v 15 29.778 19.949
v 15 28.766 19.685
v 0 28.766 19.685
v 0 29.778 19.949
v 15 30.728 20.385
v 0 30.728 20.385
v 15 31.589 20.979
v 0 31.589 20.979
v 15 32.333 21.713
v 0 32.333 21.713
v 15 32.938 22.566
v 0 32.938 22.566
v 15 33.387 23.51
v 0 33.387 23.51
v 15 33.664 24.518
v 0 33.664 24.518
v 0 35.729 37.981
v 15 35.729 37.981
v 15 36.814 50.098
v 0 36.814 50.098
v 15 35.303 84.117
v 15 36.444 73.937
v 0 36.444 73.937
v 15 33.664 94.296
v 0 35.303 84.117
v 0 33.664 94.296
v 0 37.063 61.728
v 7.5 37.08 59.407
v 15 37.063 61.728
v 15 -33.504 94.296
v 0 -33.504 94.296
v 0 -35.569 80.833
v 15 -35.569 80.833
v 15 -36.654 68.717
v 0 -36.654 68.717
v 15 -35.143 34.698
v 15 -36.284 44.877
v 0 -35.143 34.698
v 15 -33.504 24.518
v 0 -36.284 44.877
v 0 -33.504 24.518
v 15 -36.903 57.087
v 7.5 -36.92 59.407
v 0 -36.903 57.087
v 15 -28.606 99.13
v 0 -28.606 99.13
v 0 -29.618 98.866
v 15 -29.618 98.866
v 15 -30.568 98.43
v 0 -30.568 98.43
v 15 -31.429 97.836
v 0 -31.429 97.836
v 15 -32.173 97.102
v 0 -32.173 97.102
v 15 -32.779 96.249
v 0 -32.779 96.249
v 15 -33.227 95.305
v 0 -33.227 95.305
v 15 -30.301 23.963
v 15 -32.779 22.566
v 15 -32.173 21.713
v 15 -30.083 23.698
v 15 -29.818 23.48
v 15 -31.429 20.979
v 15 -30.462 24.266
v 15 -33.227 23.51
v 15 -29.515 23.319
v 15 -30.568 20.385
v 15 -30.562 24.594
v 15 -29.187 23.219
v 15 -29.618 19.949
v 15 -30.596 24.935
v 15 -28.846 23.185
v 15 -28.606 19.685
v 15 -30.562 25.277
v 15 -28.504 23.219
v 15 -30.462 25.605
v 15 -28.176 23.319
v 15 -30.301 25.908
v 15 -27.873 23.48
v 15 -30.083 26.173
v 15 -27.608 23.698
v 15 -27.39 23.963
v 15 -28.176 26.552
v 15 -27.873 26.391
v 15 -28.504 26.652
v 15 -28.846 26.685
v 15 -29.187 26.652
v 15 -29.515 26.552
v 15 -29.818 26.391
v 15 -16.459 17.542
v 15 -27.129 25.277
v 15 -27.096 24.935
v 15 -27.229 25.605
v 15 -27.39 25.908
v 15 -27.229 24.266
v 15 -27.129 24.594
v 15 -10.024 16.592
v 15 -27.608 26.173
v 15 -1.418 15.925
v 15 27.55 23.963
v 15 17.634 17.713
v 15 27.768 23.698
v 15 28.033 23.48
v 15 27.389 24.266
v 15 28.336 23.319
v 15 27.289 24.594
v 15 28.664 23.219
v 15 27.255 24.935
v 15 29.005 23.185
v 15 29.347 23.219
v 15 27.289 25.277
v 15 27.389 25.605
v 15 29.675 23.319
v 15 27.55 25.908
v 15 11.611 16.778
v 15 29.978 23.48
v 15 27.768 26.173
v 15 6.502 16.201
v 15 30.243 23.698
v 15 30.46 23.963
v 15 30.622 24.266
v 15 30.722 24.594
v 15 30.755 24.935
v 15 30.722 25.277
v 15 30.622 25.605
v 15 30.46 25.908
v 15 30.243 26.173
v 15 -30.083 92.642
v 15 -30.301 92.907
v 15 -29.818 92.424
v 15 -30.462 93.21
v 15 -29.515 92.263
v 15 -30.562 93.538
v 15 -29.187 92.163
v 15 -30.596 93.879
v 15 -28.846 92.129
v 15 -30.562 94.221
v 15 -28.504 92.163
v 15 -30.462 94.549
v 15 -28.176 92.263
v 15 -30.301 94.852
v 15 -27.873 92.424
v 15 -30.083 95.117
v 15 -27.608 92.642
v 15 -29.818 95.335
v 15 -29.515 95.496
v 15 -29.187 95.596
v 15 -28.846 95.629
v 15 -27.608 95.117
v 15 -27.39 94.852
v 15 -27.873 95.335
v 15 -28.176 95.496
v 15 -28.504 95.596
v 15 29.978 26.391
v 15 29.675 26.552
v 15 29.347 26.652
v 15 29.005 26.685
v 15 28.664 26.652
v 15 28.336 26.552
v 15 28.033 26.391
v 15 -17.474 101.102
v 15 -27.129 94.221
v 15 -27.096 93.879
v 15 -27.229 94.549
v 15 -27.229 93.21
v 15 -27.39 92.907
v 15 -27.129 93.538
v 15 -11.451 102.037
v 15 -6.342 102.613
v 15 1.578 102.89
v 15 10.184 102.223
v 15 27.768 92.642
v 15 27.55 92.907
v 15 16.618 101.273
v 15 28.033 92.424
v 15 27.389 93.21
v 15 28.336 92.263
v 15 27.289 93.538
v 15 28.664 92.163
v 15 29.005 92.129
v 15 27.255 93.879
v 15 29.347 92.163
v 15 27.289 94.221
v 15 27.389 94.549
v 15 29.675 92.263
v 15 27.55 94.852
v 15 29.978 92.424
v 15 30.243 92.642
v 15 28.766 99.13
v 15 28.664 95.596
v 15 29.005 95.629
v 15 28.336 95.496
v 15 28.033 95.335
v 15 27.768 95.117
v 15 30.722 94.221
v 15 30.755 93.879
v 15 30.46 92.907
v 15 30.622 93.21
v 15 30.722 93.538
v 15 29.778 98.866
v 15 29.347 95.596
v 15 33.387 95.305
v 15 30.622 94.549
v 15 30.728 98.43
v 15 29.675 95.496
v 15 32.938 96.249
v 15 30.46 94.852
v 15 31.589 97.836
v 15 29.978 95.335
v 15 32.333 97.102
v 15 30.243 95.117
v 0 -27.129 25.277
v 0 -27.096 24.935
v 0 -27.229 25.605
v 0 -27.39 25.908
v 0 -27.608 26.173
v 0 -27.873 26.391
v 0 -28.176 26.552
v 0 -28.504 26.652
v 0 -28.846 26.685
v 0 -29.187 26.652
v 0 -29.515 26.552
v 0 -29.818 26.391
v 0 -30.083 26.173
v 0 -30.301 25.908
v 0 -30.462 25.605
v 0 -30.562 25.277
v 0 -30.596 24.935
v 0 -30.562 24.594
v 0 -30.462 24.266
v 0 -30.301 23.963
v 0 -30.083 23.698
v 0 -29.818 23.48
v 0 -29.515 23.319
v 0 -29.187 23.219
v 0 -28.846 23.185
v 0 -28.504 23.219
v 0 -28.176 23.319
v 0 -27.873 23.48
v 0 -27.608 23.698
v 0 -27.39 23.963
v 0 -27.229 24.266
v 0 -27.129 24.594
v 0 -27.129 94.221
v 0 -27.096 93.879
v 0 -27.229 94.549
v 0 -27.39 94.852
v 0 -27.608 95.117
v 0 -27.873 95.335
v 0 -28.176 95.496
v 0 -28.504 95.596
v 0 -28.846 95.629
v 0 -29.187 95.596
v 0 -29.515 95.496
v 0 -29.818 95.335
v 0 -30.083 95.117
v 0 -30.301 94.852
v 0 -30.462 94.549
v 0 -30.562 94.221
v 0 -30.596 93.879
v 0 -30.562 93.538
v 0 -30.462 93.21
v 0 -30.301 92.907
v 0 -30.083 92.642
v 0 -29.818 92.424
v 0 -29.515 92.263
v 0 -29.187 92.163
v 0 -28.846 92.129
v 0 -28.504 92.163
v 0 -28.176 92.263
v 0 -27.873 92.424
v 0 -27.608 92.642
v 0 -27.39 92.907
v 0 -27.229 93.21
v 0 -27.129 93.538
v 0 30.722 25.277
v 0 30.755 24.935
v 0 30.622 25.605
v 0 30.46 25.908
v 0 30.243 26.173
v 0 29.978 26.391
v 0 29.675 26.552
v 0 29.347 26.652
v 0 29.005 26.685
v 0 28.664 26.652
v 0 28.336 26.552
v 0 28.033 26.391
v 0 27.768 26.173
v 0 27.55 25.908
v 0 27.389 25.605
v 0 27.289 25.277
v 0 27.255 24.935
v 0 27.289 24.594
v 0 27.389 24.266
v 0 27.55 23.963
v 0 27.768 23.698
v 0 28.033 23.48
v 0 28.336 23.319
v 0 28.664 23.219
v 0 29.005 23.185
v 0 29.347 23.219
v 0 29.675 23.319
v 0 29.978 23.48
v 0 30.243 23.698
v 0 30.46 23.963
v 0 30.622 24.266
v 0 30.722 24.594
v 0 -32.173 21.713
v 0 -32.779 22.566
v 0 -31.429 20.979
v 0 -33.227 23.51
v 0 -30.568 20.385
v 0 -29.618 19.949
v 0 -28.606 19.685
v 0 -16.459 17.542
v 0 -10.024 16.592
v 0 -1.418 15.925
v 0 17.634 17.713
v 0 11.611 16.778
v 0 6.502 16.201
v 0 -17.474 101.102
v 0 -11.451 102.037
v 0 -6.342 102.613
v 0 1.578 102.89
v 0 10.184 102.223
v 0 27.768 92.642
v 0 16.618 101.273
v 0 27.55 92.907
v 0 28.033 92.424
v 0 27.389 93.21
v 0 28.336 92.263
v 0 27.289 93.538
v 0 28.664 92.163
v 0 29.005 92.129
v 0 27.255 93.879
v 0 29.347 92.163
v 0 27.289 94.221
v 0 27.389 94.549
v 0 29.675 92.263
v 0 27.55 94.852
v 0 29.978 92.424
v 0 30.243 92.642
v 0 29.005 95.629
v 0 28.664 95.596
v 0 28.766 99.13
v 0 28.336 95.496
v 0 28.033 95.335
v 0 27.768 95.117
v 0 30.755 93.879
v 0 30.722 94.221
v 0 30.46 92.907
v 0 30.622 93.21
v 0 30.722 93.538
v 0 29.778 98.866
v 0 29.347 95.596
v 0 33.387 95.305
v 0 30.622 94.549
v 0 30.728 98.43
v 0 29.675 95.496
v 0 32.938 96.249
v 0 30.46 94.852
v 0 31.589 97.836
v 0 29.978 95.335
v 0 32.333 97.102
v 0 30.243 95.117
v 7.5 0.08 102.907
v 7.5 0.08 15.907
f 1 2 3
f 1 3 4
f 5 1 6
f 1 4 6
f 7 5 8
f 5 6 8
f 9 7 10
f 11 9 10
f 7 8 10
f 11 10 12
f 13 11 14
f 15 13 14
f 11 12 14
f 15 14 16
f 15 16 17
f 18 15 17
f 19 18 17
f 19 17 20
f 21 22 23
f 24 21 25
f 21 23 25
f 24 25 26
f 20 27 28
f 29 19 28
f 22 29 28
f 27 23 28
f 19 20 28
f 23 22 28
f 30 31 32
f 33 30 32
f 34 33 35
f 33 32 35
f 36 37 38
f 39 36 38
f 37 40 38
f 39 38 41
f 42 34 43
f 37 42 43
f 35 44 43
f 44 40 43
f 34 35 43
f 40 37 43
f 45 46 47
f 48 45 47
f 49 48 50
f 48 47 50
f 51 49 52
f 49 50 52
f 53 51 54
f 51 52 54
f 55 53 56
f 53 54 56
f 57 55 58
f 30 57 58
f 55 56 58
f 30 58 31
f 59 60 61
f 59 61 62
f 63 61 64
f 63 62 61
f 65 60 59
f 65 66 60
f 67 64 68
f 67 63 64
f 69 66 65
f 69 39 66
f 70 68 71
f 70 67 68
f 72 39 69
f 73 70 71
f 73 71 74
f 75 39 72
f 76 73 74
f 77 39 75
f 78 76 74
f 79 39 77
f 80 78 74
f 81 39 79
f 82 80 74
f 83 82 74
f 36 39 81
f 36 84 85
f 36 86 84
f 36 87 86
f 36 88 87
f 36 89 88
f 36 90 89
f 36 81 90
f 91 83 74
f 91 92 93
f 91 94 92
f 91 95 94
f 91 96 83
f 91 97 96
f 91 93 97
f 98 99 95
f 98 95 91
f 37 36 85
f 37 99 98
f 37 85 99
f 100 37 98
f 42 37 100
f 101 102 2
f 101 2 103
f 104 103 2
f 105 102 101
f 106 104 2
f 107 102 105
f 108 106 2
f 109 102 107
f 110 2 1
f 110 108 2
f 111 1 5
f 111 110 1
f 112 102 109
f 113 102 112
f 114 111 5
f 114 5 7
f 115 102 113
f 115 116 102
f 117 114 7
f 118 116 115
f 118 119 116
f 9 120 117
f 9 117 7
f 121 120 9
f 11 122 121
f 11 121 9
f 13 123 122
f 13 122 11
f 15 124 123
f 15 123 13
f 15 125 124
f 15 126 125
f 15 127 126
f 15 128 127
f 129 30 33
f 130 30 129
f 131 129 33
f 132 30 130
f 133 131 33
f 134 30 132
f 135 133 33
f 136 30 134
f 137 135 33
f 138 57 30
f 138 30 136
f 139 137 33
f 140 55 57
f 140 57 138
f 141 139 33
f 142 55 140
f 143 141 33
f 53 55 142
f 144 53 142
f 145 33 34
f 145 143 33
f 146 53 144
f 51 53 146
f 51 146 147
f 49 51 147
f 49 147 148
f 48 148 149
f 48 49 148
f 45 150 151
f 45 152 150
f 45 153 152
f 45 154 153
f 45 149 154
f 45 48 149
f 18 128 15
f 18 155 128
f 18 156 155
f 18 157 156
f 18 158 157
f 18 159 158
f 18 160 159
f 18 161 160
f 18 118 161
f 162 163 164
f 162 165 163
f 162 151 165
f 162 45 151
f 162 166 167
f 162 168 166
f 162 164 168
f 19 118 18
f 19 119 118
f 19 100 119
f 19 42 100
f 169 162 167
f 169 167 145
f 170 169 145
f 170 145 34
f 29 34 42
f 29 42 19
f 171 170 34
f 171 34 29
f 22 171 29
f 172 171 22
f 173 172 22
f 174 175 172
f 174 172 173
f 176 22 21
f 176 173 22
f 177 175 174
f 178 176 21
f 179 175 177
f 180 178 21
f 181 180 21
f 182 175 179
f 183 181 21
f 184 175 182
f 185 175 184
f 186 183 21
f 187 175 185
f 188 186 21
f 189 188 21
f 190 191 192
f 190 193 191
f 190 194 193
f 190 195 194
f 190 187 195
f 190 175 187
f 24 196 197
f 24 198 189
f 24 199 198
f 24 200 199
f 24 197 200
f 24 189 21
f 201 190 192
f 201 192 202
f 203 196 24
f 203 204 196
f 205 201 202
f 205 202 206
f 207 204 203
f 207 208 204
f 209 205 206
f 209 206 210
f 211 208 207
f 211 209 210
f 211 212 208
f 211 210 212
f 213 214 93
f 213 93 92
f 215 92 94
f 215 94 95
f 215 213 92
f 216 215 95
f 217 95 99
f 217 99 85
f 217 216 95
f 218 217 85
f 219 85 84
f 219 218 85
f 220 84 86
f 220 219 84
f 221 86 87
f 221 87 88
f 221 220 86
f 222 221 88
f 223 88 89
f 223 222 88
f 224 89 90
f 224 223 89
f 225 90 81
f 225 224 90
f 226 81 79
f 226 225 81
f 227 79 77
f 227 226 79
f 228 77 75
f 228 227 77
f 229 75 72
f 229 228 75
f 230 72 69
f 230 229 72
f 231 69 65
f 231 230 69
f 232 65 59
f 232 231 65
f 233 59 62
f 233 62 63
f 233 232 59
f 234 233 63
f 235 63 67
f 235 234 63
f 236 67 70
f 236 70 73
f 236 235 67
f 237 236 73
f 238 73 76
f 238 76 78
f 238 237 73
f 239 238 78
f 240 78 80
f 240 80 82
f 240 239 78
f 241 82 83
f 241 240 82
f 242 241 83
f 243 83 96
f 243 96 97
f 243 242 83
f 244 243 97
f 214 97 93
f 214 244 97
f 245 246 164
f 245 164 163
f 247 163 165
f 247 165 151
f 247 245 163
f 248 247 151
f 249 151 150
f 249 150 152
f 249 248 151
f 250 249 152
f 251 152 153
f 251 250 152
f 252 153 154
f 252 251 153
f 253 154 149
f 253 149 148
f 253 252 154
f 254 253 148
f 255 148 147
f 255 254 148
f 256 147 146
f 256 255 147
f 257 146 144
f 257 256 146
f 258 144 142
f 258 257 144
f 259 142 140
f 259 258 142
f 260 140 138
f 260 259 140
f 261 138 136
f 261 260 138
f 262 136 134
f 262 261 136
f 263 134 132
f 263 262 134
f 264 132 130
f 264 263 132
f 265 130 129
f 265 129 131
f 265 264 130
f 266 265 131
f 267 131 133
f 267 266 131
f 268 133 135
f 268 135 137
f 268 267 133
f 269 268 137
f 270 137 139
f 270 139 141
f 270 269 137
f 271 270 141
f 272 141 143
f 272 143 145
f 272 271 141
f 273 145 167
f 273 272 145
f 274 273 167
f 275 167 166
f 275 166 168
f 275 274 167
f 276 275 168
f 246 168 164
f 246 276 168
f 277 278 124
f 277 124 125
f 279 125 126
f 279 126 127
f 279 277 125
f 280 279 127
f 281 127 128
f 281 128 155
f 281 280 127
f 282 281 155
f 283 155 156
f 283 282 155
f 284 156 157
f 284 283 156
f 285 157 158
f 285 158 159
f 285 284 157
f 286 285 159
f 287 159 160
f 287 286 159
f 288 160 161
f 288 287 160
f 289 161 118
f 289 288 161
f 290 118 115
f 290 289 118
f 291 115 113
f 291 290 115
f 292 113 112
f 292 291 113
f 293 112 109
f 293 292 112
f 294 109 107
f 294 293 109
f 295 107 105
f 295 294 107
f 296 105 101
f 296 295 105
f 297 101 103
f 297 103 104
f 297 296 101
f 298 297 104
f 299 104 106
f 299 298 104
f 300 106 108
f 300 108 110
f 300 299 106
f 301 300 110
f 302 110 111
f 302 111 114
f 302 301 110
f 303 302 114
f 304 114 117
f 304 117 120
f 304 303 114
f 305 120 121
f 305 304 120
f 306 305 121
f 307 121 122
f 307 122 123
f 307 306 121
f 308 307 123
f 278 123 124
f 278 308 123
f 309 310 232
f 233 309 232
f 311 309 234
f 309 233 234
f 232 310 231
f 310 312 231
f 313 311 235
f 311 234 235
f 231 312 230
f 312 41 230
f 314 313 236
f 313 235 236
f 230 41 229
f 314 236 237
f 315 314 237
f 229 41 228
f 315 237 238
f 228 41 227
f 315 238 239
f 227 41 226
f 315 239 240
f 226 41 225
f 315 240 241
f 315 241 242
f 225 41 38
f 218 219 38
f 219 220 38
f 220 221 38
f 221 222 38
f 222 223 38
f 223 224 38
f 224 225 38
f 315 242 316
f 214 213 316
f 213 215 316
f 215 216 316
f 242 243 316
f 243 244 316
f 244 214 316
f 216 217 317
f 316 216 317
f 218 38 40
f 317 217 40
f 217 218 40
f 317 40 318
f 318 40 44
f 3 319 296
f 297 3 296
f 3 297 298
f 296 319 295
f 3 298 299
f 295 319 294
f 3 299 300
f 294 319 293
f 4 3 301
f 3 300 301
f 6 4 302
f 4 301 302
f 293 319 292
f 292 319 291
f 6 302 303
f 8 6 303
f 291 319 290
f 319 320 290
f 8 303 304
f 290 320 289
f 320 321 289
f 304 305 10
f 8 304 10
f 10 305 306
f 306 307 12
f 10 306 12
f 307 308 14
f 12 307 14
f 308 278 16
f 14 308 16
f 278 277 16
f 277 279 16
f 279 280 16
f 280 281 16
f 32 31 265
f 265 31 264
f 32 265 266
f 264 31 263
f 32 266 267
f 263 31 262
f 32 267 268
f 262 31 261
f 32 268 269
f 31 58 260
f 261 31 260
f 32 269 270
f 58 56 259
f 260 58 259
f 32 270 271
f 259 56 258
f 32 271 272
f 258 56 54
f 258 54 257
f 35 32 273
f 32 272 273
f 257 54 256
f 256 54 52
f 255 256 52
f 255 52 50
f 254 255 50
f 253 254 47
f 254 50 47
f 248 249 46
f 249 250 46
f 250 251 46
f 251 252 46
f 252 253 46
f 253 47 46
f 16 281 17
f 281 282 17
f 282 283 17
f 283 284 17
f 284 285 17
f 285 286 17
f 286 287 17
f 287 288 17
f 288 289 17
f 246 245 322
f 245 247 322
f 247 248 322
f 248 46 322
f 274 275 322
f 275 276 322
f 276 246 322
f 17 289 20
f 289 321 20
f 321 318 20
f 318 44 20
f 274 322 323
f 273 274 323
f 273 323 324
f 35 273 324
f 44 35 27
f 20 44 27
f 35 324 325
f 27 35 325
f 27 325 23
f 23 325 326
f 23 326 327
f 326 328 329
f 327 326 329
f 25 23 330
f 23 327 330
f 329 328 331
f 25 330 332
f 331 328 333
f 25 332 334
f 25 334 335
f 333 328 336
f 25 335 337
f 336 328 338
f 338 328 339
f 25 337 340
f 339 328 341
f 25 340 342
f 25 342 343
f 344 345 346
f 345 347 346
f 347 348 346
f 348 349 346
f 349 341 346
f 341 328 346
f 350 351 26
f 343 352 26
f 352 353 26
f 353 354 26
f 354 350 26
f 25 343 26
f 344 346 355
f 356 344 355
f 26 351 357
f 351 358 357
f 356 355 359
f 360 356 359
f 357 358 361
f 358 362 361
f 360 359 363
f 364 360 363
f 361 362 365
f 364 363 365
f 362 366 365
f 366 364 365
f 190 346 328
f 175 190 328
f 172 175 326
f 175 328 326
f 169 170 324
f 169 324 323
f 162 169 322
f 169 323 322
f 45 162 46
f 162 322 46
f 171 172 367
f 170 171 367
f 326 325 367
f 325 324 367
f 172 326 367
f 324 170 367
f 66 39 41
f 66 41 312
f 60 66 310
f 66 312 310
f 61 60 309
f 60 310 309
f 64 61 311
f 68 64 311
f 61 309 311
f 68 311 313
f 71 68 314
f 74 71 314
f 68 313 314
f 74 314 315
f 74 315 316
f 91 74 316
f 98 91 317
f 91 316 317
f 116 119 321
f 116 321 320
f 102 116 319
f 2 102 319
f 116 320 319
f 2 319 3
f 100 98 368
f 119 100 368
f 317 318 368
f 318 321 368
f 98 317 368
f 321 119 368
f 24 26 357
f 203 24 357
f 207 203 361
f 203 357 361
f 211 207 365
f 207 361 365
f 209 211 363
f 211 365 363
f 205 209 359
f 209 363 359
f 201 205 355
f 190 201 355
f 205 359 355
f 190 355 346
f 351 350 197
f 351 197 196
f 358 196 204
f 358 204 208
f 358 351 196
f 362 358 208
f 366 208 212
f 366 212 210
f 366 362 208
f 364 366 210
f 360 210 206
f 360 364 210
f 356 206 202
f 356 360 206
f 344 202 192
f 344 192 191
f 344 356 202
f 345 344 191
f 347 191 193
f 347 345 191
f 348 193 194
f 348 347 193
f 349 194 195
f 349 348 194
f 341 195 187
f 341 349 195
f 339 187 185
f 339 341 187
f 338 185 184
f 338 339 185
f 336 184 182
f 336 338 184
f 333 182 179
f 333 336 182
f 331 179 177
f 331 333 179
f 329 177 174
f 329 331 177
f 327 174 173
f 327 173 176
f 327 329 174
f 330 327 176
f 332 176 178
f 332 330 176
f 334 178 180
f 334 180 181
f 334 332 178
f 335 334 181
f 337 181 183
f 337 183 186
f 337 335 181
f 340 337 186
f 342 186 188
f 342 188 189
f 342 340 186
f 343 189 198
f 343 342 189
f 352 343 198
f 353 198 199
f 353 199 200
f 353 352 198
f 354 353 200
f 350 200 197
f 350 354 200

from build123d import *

# Parameters (mm, degrees)
F0_R     = 3
F0_R_2   = 1.75
F1_DEPTH = 15


with BuildPart() as f1:
    # F0 (on Right) → F1 (new body)
    with BuildSketch(Plane.YZ):
        with BuildLine():
            ThreePointArc((33.6642538877, 94.2964592226), (31.9768261624, 97.4851943073), (28.7658063512, 99.1298205687))
            add(Edge.make_bspline(
                [(28.7658063512, 99.1298205687), (19.203840359, 100.7513284104), (0.0799083746, 105.0635755317), (-19.0440236097, 100.7513284104), (-28.6059896019, 99.1298205687)],
                knots=[0.0624771081, 0.0624771081, 0.0624771081, 0.0624771081, 0.5, 0.9375228919, 0.9375228919, 0.9375228919, 0.9375228919], degree=3))
            ThreePointArc((-28.6059896019, 99.1298205687), (-31.8170094131, 97.4851943073), (-33.5044371384, 94.2964592226))
            add(Edge.make_bspline(
                [(-33.5044371384, 94.2964592226), (-35.6369863321, 82.6667901388), (-38.2031969186, 59.4074519711), (-35.6369863321, 36.1481138033), (-33.5044371384, 24.5184447195)],
                knots=[0.0534866237, 0.0534866237, 0.0534866237, 0.0534866237, 0.5, 0.9465133763, 0.9465133763, 0.9465133763, 0.9465133763], degree=3))
            ThreePointArc((-33.5044371384, 24.5184447195), (-31.8170094131, 21.3297096348), (-28.6059896019, 19.6850833734))
            add(Edge.make_bspline(
                [(-28.6059896019, 19.6850833734), (-19.0440236097, 18.0635755317), (0.0799083746, 13.7513284104), (19.203840359, 18.0635755317), (28.7658063512, 19.6850833734)],
                knots=[0.0624771081, 0.0624771081, 0.0624771081, 0.0624771081, 0.5, 0.9375228919, 0.9375228919, 0.9375228919, 0.9375228919], degree=3))
            ThreePointArc((28.7658063512, 19.6850833734), (31.9768261624, 21.3297096348), (33.6642538877, 24.5184447195))
            add(Edge.make_bspline(
                [(33.6642538877, 24.5184447195), (35.7968030814, 36.1481138033), (38.3630136679, 59.4074519711), (35.7968030814, 82.6667901388), (33.6642538877, 94.2964592226)],
                knots=[0.0534866237, 0.0534866237, 0.0534866237, 0.0534866237, 0.5, 0.9465133763, 0.9465133763, 0.9465133763, 0.9465133763], degree=3))
        make_face()
        with Locations((-28.8455340613, 24.9354520307)):
            Circle(F0_R, mode=Mode.SUBTRACT)
        with Locations((29.0053508105, 24.9354520307)):
            Circle(F0_R, mode=Mode.SUBTRACT)
        with Locations((-28.8455340613, 93.8794519114)):
            Circle(F0_R, mode=Mode.SUBTRACT)
        with Locations((29.0053508105, 93.8794519114)):
            Circle(F0_R, mode=Mode.SUBTRACT)
        with Locations((29.0053508105, 93.8794519114)):
            Circle(F0_R)
        with Locations((29.0053508105, 93.8794519114)):
            Circle(F0_R_2, mode=Mode.SUBTRACT)
        with Locations((-28.8455340613, 93.8794519114)):
            Circle(F0_R)
        with Locations((-28.8455340613, 93.8794519114)):
            Circle(F0_R_2, mode=Mode.SUBTRACT)
        with Locations((-28.8455340613, 24.9354520307)):
            Circle(F0_R)
        with Locations((-28.8455340613, 24.9354520307)):
            Circle(F0_R_2, mode=Mode.SUBTRACT)
        with Locations((29.0053508105, 24.9354520307)):
            Circle(F0_R)
        with Locations((29.0053508105, 24.9354520307)):
            Circle(F0_R_2, mode=Mode.SUBTRACT)
    extrude(amount=F1_DEPTH)


solid = f1.part
